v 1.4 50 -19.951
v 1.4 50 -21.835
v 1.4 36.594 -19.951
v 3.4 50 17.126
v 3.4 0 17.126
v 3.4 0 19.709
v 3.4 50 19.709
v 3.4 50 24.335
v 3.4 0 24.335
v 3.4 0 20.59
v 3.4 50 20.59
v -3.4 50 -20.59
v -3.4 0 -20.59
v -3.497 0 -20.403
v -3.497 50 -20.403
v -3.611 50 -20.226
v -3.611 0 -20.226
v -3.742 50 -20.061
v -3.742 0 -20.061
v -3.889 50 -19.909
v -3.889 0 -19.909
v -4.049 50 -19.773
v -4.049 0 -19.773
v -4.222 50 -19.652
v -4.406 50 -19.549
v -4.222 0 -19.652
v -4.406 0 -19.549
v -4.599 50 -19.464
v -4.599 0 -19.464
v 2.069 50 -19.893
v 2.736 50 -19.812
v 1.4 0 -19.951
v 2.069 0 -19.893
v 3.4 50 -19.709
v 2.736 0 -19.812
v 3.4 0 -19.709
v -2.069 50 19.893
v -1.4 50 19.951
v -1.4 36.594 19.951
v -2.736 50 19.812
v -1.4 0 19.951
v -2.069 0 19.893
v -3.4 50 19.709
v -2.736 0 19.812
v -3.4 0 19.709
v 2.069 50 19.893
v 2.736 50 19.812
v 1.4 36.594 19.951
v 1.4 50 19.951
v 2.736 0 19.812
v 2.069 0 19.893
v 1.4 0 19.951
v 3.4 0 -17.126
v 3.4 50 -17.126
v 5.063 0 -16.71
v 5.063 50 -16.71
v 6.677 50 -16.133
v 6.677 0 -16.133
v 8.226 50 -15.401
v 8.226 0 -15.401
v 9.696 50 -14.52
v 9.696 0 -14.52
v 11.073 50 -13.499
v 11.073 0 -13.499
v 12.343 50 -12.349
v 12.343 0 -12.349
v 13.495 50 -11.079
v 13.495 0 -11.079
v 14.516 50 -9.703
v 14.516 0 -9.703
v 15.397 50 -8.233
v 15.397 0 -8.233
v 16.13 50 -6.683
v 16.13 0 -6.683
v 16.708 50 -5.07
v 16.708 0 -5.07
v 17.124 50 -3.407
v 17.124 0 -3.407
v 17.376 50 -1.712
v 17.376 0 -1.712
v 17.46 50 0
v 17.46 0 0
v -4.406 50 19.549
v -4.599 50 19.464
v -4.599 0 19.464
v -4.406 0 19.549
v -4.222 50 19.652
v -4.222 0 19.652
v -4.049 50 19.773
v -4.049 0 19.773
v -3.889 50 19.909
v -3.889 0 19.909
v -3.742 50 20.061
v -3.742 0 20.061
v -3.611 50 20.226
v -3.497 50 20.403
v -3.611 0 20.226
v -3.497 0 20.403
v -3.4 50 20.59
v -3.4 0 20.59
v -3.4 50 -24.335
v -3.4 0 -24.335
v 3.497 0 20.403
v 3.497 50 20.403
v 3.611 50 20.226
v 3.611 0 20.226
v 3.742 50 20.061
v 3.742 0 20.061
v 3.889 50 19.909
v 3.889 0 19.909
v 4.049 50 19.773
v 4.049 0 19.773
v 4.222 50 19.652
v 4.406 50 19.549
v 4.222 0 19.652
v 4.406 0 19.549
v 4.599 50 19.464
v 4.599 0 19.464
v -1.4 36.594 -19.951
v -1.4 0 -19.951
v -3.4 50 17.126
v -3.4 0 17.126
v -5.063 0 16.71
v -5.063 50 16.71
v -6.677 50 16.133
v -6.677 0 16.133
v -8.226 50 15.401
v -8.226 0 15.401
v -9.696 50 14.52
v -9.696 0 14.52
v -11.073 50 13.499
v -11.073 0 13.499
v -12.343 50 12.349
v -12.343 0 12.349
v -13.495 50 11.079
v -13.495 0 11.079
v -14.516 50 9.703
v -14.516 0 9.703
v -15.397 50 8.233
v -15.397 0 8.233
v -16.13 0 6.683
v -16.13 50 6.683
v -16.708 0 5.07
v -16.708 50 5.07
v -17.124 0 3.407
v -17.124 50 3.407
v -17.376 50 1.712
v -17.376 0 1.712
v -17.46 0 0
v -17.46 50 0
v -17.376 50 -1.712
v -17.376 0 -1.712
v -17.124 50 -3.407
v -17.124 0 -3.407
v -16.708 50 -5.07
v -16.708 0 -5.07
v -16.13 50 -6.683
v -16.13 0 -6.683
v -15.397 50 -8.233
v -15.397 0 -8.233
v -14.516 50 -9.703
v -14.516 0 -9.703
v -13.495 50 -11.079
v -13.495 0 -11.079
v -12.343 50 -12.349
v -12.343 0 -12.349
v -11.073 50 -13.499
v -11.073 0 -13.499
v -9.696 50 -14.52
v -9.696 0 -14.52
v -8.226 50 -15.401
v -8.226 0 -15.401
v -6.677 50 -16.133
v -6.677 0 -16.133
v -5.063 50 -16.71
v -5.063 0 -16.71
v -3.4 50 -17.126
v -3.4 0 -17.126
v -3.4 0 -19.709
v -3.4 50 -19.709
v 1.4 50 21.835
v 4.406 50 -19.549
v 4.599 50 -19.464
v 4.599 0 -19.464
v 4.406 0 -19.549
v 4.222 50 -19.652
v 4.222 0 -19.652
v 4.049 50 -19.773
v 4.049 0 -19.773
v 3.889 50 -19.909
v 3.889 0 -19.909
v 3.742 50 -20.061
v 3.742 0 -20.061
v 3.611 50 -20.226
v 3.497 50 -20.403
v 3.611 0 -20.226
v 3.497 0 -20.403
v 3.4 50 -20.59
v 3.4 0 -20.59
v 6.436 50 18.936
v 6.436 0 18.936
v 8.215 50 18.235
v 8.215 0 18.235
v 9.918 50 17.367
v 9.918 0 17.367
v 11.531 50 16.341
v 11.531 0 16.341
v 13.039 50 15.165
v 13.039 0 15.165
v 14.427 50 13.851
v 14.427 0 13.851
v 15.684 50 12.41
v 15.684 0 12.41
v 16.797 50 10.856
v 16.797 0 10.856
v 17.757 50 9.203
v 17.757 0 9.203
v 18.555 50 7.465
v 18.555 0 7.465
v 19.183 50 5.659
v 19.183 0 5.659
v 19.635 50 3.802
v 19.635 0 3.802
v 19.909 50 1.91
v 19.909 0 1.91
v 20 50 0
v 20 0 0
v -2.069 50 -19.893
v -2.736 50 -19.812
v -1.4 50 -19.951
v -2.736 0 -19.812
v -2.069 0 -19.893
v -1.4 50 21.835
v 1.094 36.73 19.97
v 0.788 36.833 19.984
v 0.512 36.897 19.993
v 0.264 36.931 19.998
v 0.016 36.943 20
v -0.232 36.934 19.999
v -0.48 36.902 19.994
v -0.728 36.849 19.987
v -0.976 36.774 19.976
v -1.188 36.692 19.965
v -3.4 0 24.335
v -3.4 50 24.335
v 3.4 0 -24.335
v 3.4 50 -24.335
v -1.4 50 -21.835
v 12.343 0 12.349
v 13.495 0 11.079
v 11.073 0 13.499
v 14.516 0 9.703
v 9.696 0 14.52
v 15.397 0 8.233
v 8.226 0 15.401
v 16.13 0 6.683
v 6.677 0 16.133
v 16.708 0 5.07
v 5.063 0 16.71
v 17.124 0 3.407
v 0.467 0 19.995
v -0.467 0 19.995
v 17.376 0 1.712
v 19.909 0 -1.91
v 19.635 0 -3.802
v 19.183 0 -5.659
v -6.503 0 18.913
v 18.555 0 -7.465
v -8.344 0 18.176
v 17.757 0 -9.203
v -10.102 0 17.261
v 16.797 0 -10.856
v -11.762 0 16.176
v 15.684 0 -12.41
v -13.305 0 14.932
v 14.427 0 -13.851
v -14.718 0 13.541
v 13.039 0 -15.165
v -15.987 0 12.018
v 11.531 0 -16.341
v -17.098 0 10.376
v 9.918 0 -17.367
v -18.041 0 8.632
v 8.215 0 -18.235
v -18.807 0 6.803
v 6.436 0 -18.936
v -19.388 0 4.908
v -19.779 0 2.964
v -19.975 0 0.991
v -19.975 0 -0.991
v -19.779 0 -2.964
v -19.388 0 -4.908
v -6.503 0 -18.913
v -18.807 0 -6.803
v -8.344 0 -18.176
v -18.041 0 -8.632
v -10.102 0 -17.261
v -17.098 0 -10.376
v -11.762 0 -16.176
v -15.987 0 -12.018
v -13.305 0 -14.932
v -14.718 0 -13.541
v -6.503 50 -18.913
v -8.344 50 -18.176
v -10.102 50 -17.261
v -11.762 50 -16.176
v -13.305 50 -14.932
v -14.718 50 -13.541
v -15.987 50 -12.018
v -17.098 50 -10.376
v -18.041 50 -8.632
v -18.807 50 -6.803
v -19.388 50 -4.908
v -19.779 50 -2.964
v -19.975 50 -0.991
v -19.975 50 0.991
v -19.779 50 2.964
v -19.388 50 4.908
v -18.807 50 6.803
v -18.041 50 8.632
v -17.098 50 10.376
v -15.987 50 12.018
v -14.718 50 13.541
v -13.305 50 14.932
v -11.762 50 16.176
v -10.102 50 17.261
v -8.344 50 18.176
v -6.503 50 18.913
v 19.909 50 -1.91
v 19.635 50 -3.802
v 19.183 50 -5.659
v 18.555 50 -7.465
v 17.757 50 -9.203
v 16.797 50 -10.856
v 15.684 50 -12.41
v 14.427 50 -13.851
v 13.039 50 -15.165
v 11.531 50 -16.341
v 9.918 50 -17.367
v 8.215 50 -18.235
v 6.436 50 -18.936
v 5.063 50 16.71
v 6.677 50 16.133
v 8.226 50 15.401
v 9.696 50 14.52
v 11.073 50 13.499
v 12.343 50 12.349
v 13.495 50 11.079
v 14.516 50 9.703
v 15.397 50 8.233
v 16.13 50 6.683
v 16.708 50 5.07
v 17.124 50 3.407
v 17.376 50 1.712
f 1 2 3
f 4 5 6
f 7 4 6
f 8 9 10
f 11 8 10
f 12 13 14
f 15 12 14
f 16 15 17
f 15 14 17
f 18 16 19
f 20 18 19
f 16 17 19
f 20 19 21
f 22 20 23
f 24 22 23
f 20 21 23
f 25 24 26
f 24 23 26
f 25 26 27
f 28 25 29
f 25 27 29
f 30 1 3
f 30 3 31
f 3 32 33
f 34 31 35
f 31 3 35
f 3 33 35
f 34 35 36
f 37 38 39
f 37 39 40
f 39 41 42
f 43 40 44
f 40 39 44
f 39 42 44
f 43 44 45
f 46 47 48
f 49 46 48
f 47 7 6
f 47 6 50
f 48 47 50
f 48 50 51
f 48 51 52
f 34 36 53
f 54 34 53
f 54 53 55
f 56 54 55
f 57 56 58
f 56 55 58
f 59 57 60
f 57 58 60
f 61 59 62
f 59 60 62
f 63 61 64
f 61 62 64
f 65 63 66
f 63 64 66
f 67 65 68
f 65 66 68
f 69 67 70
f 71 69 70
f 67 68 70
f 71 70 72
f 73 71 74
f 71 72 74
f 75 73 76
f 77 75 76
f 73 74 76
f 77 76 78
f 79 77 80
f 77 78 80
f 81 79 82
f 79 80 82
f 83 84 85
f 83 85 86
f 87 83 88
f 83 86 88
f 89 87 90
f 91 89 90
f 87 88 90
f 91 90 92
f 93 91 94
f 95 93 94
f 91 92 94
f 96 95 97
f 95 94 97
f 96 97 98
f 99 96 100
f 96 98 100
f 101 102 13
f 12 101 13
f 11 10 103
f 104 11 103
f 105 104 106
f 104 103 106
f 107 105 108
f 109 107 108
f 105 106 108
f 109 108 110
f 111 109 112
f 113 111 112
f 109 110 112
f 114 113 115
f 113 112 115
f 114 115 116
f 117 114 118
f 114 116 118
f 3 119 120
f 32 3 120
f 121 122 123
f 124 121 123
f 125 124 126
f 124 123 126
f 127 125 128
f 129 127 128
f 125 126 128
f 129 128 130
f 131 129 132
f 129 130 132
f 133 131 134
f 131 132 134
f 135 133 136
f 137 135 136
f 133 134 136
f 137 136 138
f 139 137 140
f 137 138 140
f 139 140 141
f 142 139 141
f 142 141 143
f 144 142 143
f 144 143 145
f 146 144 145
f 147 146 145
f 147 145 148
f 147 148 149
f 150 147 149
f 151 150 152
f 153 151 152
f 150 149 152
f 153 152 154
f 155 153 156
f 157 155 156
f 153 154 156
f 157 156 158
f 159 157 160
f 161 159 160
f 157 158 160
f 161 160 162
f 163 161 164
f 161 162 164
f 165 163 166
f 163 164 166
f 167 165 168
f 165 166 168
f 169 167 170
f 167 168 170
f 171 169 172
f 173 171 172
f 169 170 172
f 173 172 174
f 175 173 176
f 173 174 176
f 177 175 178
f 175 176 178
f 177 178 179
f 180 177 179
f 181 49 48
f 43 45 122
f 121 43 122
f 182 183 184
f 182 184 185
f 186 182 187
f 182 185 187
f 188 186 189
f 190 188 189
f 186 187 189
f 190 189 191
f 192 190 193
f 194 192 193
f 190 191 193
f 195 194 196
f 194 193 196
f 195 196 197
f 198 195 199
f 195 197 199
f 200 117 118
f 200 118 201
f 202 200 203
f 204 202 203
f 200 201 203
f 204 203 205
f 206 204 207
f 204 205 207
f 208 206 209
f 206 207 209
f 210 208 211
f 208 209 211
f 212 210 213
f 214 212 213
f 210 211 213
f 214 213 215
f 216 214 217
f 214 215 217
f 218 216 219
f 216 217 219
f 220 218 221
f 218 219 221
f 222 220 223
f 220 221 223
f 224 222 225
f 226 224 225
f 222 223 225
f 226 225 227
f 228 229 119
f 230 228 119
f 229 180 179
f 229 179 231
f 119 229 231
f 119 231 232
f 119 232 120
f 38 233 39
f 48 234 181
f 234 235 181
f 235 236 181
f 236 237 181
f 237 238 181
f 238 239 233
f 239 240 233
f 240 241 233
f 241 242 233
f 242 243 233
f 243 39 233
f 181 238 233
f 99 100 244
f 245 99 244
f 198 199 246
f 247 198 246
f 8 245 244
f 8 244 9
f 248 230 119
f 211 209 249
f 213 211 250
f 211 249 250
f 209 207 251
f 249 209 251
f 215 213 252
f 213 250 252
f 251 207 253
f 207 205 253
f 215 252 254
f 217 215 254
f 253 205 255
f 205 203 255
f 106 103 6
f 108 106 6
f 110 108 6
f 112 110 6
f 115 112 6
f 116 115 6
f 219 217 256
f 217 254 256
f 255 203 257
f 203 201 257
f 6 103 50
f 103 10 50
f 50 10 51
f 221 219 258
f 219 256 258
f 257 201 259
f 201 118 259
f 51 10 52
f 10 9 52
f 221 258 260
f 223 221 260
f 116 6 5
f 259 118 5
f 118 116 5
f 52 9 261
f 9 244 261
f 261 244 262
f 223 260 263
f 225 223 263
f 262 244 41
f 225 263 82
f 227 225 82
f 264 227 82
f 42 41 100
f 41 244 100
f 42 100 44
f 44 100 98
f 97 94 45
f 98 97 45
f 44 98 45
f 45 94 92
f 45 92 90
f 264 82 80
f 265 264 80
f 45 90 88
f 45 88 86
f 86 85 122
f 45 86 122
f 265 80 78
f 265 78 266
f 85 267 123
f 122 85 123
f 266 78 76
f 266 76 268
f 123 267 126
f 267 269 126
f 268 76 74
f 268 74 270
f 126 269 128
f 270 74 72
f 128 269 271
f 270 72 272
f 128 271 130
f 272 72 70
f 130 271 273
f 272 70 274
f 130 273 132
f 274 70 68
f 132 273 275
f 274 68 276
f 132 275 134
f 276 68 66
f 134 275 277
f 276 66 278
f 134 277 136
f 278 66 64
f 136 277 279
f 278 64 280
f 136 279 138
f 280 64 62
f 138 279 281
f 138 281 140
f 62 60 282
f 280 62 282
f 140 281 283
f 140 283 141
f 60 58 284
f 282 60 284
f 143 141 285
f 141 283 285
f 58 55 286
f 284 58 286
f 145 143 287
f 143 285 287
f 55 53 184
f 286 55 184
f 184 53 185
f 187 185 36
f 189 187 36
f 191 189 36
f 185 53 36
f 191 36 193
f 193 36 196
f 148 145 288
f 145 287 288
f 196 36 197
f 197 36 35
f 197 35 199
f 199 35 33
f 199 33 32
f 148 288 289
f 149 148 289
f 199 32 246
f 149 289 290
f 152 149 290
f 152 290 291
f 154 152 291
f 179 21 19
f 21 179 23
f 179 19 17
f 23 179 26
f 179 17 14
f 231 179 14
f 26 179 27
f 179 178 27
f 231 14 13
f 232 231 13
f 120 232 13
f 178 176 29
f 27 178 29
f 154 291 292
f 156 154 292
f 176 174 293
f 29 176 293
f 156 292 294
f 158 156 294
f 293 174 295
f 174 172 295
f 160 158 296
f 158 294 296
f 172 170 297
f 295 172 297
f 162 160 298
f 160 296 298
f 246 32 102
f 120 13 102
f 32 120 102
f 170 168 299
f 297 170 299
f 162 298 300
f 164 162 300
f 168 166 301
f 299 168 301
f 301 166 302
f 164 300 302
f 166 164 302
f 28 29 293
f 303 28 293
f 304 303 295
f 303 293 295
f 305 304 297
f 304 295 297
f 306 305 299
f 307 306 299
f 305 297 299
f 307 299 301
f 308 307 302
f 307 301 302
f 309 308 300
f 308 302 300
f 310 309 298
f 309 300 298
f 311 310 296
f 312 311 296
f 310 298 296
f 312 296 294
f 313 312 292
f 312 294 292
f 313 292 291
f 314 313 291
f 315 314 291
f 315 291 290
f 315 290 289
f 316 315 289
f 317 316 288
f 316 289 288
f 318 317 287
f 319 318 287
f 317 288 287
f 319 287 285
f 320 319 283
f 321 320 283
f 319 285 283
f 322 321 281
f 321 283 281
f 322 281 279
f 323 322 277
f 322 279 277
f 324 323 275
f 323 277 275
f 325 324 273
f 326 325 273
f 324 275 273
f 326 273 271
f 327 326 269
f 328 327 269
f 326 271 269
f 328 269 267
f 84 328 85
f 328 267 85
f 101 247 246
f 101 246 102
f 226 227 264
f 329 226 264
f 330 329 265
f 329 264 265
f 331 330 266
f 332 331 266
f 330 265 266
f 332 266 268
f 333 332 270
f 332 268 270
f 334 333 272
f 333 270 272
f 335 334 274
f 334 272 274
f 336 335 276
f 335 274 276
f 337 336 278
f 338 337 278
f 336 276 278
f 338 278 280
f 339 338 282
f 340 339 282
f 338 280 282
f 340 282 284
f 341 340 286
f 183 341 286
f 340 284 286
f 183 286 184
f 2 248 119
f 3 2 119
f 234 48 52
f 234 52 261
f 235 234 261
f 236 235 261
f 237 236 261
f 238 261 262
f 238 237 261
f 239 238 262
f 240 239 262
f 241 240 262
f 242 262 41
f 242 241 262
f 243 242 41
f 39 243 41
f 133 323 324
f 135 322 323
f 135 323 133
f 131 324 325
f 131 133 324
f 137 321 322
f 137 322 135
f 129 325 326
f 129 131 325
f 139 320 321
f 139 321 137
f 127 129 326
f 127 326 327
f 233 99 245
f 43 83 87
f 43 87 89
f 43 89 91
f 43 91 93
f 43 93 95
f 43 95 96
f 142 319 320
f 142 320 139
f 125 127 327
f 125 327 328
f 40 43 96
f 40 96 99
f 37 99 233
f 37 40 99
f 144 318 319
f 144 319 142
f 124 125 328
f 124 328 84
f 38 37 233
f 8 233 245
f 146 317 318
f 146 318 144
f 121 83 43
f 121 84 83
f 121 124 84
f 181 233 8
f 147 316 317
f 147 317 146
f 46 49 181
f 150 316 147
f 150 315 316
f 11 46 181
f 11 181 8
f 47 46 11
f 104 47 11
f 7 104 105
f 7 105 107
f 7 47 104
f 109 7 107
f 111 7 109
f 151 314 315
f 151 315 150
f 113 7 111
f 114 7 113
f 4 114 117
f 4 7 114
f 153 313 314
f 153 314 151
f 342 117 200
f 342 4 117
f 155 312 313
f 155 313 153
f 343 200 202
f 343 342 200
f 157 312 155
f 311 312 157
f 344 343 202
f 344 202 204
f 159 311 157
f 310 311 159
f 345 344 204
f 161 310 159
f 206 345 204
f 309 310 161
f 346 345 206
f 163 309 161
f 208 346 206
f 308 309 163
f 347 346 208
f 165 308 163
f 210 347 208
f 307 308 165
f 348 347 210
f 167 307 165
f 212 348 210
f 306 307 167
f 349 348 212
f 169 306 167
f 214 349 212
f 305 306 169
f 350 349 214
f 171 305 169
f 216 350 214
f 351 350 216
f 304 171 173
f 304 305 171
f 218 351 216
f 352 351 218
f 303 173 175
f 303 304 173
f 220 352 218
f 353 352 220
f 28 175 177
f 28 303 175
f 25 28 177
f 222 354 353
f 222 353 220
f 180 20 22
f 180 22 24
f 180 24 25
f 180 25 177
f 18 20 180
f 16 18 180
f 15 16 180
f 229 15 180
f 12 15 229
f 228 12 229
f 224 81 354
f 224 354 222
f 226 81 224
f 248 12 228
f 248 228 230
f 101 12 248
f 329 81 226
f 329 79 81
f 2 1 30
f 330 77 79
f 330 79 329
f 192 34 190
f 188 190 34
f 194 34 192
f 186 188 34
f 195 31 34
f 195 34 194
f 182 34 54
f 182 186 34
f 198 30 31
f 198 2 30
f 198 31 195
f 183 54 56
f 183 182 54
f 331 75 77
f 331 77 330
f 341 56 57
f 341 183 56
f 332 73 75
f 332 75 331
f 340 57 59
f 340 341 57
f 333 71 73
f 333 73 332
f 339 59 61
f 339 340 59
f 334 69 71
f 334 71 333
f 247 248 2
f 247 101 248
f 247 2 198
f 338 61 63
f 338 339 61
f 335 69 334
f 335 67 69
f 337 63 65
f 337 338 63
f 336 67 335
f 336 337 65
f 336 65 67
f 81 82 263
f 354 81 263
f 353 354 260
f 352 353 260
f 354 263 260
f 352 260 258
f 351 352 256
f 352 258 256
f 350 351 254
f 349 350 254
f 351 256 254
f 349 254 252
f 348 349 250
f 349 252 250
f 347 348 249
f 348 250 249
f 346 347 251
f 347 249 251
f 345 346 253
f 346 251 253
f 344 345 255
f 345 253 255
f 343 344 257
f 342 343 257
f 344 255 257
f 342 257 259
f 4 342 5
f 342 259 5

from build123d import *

# Parameters (mm, degrees)
BOSS_EXTRUDE1_DEPTH     = 50
BOSS_EXTRUDE2_DEPTH     = 2.8
CUT_EXTRUDE1_DEPTH      = 60.094773246
CUT_EXTRUDE1_DEPTH_BACK = 60.094773246


with BuildPart() as part:
    # Sketch1 → Boss-Extrude1 (new body)
    with BuildSketch(Plane(origin=(0, 0, 0), x_dir=(1, 0, 0), z_dir=(0, 1, 0))):
        with BuildLine():
            Line((3.4, 20.590136136), (3.4, 19.708881247))
            ThreePointArc((3.4, 19.708881247), (4.001170568, 19.595678965), (4.598597833, 19.464143905))
            ThreePointArc((4.598597833, 19.464143905), (3.888587722, 19.909290009), (3.4, 20.590136136))
        make_face()
        with BuildLine():
            ThreePointArc((-4.598597833, 19.464143905), (-4.001170568, 19.595678965), (-3.4, 19.708881247))
            Line((-3.4, 19.708881247), (-3.4, 20.590136136))
            ThreePointArc((-3.4, 20.590136136), (-3.888587722, 19.909290009), (-4.598597833, 19.464143905))
        make_face()
        with BuildLine():
            Line((-1.4, 19.950939827), (-1.4, 21.835))
            Line((-1.4, 21.835), (1.4, 21.835))
            Line((1.4, 21.835), (1.4, 19.950939827))
            ThreePointArc((1.4, 19.950939827), (2.403049748, 19.855108962), (3.4, 19.708881247))
            Line((3.4, 19.708881247), (3.4, 20.590136136))
            Line((3.4, 20.590136136), (3.4, 24.335))
            Line((3.4, 24.335), (-3.4, 24.335))
            Line((-3.4, 24.335), (-3.4, 20.590136136))
            Line((-3.4, 20.590136136), (-3.4, 19.708881247))
            ThreePointArc((-3.4, 19.708881247), (-2.403049748, 19.855108962), (-1.4, 19.950939827))
        make_face()
        with BuildLine():
            Line((-3.4, 17.125758377), (-3.4, 19.708881247))
            ThreePointArc((-3.4, 19.708881247), (-4.001170568, 19.595678965), (-4.598597833, 19.464143905))
            ThreePointArc((-4.598597833, 19.464143905), (-20, 0), (-4.598597833, -19.464143905))
            ThreePointArc((-4.598597833, -19.464143905), (-4.001170568, -19.595678965), (-3.4, -19.708881247))
            Line((-3.4, -19.708881247), (-3.4, -17.125758377))
            ThreePointArc((-3.4, -17.125758377), (-17.46, 0), (-3.4, 17.125758377))
        make_face()
        with BuildLine():
            ThreePointArc((4.598597833, 19.464143905), (4.001170568, 19.595678965), (3.4, 19.708881247))
            Line((3.4, 19.708881247), (3.4, 17.125758377))
            ThreePointArc((3.4, 17.125758377), (13.494732306, 11.078980097), (17.46, 0))
            ThreePointArc((17.46, 0), (13.494732306, -11.078980097), (3.4, -17.125758377))
            Line((3.4, -17.125758377), (3.4, -19.708881247))
            ThreePointArc((3.4, -19.708881247), (4.001170568, -19.595678965), (4.598597833, -19.464143905))
            ThreePointArc((4.598597833, -19.464143905), (15.683940141, -12.410238582), (20, 0))
            ThreePointArc((20, 0), (15.683940141, 12.410238582), (4.598597833, 19.464143905))
        make_face()
        with BuildLine():
            ThreePointArc((4.598597833, -19.464143905), (4.001170568, -19.595678965), (3.4, -19.708881247))
            Line((3.4, -19.708881247), (3.4, -20.590136136))
            ThreePointArc((3.4, -20.590136136), (3.888587722, -19.909290009), (4.598597833, -19.464143905))
        make_face()
        with BuildLine():
            ThreePointArc((-3.4, -19.708881247), (-4.001170568, -19.595678965), (-4.598597833, -19.464143905))
            ThreePointArc((-4.598597833, -19.464143905), (-3.888587722, -19.909290009), (-3.4, -20.590136136))
            Line((-3.4, -20.590136136), (-3.4, -19.708881247))
        make_face()
        with BuildLine():
            Line((-1.4, -21.835), (-1.4, -19.950939827))
            ThreePointArc((-1.4, -19.950939827), (-2.403049748, -19.855108962), (-3.4, -19.708881247))
            Line((-3.4, -19.708881247), (-3.4, -20.590136136))
            Line((-3.4, -20.590136136), (-3.4, -24.335))
            Line((-3.4, -24.335), (3.4, -24.335))
            Line((3.4, -24.335), (3.4, -20.590136136))
            Line((3.4, -20.590136136), (3.4, -19.708881247))
            ThreePointArc((3.4, -19.708881247), (2.403049748, -19.855108962), (1.4, -19.950939827))
            Line((1.4, -19.950939827), (1.4, -21.835))
            Line((1.4, -21.835), (-1.4, -21.835))
        make_face()
    extrude(amount=BOSS_EXTRUDE1_DEPTH)

    # Sketch2 → Boss-Extrude2 (add)
    with BuildSketch(Plane(origin=(-1.4, 0, 0), x_dir=(0, 0, -1), z_dir=(1, 0, 0))):
        Polygon((21.835, 0), (21.835, 50), (19.950939827, 36.594215293), (19.950939827, 0), align=None)
        Polygon((-21.835, 50), (-21.835, 0), (-14.807958265, 0), align=None)
    extrude(amount=BOSS_EXTRUDE2_DEPTH)

    # Sketch3 → Cut-Extrude1 (cut, two sides: drawn at the far end of the back side and taken through both)
    with BuildSketch(Plane.XZ.offset(-CUT_EXTRUDE1_DEPTH_BACK)):
        with BuildLine():
            ThreePointArc((1.4, 19.950939827), (0, 20), (-1.4, 19.950939827))
            Line((-1.4, 19.950939827), (-1.4, 14.807958265))
            Line((-1.4, 14.807958265), (1.4, 14.807958265))
            Line((1.4, 14.807958265), (1.4, 19.950939827))
        make_face()
    extrude(amount=CUT_EXTRUDE1_DEPTH + CUT_EXTRUDE1_DEPTH_BACK, mode=Mode.SUBTRACT)


solid = part.part
